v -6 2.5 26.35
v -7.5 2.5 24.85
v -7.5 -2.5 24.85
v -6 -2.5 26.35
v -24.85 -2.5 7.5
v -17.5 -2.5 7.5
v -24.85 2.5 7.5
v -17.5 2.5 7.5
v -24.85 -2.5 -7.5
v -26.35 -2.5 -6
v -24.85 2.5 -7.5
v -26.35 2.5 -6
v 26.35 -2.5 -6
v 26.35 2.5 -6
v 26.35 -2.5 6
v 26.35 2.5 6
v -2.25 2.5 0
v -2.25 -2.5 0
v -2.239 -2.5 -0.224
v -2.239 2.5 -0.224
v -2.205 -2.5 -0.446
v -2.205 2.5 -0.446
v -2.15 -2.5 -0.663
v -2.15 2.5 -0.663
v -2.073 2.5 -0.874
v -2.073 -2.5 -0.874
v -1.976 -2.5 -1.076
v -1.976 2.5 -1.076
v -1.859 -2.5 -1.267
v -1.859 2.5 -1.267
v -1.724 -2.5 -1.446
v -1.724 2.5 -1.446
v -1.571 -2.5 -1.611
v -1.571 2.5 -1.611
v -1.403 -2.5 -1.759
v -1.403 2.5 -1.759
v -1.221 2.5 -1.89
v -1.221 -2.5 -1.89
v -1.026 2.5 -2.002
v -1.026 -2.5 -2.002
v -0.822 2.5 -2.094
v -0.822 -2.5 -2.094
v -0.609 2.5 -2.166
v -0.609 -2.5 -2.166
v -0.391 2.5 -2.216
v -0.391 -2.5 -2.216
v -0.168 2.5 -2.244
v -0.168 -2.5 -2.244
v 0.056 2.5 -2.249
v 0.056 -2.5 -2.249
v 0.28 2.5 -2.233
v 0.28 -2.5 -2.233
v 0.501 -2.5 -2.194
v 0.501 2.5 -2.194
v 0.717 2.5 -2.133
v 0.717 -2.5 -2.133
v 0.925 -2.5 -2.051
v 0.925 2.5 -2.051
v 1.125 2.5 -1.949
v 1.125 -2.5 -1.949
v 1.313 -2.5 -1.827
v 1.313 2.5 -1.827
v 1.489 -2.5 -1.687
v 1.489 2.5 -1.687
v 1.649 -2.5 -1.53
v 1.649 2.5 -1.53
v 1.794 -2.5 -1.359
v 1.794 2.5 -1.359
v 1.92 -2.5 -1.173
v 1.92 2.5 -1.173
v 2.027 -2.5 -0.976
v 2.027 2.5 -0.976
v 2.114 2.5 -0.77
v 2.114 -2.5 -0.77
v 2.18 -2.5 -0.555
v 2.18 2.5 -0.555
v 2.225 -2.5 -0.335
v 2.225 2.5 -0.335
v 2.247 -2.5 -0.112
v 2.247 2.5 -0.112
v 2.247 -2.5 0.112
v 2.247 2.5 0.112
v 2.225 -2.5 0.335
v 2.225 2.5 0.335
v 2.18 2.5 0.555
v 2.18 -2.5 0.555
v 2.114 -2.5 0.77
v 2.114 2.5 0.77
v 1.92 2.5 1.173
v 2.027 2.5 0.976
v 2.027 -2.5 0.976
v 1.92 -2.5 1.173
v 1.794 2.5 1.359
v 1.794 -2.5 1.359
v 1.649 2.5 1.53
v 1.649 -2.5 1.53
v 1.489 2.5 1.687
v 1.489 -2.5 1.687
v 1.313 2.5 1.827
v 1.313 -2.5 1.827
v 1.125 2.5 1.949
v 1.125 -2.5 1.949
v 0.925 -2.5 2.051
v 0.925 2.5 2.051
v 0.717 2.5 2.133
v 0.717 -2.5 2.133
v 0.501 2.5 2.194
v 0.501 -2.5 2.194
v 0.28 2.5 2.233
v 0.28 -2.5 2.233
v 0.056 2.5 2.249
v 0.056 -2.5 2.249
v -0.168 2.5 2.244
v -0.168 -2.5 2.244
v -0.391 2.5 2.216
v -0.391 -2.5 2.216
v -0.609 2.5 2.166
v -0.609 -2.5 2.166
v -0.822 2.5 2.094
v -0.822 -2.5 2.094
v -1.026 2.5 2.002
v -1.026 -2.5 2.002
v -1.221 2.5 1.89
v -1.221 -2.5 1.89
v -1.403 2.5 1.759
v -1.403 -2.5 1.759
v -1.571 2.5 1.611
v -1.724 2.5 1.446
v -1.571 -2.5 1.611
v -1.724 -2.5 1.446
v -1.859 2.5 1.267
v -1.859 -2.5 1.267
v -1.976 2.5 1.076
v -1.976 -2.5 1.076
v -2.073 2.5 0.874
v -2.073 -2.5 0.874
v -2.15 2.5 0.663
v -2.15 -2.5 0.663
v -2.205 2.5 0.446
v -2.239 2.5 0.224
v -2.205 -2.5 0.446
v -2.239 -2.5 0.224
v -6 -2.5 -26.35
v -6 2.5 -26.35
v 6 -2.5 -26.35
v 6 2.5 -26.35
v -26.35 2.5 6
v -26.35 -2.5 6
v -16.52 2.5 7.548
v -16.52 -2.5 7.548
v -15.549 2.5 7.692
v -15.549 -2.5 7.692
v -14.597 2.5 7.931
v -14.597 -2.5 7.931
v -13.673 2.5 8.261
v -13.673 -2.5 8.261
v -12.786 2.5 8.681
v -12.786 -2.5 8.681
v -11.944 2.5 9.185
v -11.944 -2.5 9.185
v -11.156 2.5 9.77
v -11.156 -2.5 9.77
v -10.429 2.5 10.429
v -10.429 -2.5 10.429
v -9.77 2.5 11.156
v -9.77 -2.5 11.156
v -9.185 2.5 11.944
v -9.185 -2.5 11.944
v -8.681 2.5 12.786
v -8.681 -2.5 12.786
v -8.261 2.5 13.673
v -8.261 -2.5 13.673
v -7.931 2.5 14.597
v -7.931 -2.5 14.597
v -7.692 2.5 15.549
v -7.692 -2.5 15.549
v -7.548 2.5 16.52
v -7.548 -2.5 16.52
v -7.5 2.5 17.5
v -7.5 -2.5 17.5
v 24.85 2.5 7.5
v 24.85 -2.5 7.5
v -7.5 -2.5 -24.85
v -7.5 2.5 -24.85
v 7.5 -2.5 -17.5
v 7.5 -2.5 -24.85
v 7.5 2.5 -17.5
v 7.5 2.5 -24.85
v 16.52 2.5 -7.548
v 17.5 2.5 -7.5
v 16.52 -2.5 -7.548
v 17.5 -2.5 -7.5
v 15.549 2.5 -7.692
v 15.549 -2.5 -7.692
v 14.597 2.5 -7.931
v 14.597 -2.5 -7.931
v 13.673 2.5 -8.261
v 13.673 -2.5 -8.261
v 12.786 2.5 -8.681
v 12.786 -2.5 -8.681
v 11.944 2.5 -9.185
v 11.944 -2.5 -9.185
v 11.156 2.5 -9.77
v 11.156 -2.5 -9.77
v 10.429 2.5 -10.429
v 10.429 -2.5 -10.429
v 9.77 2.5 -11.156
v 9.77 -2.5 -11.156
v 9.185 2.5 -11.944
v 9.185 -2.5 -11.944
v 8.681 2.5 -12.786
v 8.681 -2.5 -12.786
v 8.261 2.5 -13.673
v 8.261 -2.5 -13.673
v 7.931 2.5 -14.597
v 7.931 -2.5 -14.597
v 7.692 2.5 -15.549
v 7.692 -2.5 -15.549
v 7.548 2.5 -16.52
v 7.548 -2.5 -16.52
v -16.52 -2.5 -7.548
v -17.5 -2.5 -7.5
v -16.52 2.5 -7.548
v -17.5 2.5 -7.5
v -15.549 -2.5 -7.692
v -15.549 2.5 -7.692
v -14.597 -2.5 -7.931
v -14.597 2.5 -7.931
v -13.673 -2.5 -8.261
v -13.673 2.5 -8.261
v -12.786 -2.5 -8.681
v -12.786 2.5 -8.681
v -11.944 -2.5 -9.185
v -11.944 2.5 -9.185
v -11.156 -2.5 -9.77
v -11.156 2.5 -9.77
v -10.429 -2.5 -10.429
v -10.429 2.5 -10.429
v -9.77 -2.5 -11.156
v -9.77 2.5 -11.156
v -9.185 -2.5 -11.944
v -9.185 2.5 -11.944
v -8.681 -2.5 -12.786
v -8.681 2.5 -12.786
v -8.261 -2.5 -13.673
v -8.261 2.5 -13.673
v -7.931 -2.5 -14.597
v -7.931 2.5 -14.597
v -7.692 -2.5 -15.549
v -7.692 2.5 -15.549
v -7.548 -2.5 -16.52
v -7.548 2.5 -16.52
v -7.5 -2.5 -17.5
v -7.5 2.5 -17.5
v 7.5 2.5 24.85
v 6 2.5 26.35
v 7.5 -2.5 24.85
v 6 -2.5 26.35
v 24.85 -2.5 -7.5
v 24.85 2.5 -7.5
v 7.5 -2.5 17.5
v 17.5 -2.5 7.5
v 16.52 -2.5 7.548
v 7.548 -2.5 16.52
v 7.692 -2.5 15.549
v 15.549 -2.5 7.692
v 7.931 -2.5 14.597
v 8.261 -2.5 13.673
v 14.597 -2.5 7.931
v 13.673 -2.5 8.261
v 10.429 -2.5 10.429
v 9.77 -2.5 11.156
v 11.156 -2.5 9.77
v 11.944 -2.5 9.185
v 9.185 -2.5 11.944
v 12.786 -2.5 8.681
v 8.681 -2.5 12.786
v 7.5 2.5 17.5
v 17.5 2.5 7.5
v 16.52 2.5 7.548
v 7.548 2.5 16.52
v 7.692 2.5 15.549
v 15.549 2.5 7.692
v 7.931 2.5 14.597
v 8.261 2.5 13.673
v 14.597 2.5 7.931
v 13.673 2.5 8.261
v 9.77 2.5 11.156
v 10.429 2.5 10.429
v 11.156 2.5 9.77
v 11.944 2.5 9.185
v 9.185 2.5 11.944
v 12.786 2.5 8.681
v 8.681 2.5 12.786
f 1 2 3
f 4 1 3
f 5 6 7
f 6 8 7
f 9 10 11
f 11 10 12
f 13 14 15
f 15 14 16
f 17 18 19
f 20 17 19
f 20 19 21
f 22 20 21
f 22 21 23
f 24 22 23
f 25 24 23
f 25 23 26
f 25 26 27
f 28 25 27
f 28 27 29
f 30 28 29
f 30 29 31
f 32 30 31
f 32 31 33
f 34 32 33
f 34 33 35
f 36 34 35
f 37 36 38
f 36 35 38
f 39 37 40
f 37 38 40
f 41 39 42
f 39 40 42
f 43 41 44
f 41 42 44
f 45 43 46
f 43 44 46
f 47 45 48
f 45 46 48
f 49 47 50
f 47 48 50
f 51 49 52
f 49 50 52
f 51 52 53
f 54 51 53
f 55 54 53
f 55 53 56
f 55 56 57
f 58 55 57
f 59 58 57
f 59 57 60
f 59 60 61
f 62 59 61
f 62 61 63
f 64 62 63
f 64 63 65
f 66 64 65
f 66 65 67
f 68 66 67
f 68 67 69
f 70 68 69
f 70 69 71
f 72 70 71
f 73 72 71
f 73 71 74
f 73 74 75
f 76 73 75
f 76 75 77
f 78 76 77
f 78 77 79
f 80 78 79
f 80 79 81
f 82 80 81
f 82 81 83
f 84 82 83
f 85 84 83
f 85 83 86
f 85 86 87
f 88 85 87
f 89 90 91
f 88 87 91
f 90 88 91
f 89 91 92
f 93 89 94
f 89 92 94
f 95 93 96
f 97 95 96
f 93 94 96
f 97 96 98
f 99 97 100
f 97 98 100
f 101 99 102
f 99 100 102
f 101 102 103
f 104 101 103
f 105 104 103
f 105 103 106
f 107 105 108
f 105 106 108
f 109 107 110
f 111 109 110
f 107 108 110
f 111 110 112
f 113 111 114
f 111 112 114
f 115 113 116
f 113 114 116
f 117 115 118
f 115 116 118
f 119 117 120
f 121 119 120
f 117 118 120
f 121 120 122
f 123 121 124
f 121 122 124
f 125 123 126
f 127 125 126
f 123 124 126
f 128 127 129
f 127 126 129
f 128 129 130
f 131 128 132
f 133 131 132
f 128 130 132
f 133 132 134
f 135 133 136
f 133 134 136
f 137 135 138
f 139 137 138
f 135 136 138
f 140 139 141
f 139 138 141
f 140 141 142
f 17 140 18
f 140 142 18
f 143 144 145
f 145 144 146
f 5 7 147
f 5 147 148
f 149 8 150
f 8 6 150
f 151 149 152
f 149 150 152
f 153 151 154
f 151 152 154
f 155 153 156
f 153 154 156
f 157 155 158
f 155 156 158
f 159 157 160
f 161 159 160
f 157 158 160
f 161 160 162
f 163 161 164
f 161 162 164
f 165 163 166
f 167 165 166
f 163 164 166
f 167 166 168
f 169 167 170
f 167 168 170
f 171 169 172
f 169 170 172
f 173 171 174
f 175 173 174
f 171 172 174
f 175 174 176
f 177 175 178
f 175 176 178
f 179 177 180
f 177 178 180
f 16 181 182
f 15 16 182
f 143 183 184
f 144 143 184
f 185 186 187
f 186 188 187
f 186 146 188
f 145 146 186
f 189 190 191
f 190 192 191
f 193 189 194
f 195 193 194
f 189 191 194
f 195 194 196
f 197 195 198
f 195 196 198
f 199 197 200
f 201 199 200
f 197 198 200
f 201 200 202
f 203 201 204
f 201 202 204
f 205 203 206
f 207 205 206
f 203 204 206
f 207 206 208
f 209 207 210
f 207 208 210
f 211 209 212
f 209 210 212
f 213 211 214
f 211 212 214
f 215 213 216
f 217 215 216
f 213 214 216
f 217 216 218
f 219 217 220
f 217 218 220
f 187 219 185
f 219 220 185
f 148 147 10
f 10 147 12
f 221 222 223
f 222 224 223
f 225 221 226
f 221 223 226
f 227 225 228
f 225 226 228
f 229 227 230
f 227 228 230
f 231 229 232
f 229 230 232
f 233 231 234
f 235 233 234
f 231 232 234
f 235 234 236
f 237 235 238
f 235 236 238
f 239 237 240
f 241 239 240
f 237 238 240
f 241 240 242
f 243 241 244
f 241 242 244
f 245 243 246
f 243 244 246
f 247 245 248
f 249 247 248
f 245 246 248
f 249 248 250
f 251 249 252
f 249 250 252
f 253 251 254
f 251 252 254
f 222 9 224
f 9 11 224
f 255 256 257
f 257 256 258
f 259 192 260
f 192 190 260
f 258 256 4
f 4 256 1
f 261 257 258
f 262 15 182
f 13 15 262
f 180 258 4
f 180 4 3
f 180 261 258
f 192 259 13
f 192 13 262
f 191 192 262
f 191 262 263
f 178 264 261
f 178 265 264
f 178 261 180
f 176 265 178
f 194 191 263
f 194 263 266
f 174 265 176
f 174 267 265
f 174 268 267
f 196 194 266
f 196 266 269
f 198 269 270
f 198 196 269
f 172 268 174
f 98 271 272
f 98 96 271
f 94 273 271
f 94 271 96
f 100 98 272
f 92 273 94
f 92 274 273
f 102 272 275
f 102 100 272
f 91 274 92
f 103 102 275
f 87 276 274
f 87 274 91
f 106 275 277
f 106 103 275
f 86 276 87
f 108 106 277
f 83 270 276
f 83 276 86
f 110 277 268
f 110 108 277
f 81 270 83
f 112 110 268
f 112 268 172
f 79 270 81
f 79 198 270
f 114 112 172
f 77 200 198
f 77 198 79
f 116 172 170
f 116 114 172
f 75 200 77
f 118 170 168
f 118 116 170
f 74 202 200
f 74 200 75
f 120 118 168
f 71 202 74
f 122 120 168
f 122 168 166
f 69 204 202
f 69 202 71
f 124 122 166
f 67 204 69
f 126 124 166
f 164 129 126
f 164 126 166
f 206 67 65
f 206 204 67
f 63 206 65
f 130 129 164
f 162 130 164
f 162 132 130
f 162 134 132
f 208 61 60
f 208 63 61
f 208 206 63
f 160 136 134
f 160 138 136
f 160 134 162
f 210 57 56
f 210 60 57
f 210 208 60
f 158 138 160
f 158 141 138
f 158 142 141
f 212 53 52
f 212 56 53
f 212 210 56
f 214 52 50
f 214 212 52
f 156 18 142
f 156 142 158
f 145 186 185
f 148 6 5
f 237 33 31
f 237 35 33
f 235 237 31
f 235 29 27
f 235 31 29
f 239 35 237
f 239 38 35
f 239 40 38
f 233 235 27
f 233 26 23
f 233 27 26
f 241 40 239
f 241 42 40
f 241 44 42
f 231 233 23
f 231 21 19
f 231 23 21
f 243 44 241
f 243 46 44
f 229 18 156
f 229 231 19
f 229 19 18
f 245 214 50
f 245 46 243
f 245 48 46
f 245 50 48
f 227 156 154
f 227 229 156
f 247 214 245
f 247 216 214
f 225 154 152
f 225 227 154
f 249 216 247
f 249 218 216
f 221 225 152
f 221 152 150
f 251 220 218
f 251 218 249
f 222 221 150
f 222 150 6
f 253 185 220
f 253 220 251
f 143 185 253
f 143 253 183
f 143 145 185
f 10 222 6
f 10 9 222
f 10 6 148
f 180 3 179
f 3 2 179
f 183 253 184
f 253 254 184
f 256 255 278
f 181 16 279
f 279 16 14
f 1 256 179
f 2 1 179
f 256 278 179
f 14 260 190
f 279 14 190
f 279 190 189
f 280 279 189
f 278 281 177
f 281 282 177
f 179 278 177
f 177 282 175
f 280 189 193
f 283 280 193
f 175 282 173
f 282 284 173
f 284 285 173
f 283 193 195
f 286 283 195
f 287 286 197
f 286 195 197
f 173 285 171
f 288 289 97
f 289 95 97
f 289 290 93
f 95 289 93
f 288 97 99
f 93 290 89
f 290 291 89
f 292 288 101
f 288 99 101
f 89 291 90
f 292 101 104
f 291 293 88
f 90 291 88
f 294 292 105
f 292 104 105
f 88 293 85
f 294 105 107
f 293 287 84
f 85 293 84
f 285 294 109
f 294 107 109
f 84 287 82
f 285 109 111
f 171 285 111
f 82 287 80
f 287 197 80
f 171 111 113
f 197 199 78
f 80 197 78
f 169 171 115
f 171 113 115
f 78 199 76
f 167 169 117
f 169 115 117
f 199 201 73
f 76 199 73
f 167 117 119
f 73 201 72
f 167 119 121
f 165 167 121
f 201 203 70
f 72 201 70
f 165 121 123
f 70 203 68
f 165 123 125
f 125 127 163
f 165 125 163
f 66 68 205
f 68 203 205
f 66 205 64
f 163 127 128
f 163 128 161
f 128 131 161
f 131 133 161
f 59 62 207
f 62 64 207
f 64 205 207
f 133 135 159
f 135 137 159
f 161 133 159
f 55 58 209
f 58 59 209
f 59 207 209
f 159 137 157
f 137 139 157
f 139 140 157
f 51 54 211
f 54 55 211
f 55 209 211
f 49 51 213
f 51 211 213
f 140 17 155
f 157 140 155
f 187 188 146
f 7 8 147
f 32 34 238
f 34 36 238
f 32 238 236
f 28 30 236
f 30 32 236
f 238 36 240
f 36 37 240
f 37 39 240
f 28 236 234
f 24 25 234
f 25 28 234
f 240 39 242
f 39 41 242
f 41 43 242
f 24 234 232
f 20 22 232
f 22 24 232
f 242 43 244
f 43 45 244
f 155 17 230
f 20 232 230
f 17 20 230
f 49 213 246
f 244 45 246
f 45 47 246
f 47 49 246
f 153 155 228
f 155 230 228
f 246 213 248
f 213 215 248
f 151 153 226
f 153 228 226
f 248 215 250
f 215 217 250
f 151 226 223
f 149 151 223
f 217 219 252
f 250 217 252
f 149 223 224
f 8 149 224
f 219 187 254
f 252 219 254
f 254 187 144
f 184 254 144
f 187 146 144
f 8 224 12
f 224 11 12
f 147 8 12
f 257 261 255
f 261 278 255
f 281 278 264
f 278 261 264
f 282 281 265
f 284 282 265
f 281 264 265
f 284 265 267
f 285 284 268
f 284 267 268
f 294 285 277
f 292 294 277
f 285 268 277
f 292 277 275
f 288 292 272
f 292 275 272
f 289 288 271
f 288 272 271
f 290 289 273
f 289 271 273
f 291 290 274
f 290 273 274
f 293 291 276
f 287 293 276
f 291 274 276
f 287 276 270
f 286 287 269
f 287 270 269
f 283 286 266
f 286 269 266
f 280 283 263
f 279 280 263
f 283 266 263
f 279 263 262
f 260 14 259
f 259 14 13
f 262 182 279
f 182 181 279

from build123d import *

# Parameters (mm, degrees)
BOSS_EXTRUDE1_DEPTH      = 2.5
FILLET1_R                = 10
CHAMFER1_SIZE            = 1.5
M4_CLEARANCE_HOLE1_D     = 4.5
M4_CLEARANCE_HOLE1_DEPTH = 5.2
M4_CLEARANCE_HOLE1_TIP   = 1.351936393


with BuildPart() as part:
    # Sketch2 → Boss-Extrude1 (new, symmetric)
    with BuildSketch(Plane(origin=(0, 0, 0), x_dir=(1, 0, 0), z_dir=(0, 1, 0))):
        Polygon((-7.5, 26.35), (7.5, 26.35), (7.5, 7.5), (26.35, 7.5), (26.35, -7.5), (7.5, -7.5), (7.5, -26.35), (-7.5, -26.35), (-7.5, -7.5), (-26.35, -7.5), (-26.35, 7.5), (-7.5, 7.5), align=None)
    extrude(amount=BOSS_EXTRUDE1_DEPTH, both=True)

    # Fillet1
    fillet1_edges = [part.edges().sort_by_distance(p)[0] for p in [
        (7.5, 0, 7.5),
        (-7.5, 0, 7.5),
        (-7.5, 0, -7.5),
        (7.5, 0, -7.5),
    ]]
    fillet(fillet1_edges, radius=FILLET1_R)

    # Chamfer1
    chamfer1_edges = [part.edges().sort_by_distance(p)[0] for p in [
        (26.35, 0, -7.5),
        (26.35, 0, 7.5),
        (7.5, 0, 26.35),
        (-7.5, 0, 26.35),
        (-26.35, 0, 7.5),
        (-26.35, 0, -7.5),
        (-7.5, 0, -26.35),
        (7.5, 0, -26.35),
    ]]
    chamfer(chamfer1_edges, length=CHAMFER1_SIZE)

    # M4 Clearance Hole1
    with Locations(Plane(origin=(0, 2.5, 0), x_dir=(1, 0, 0), z_dir=(0, 1, 0))):
        with Locations((0, 0)):
            Hole(M4_CLEARANCE_HOLE1_D / 2, depth=M4_CLEARANCE_HOLE1_DEPTH)
            with Locations((0, 0, -(M4_CLEARANCE_HOLE1_DEPTH + M4_CLEARANCE_HOLE1_TIP / 2))):  # 118° drill point
                Cone(0, M4_CLEARANCE_HOLE1_D / 2, M4_CLEARANCE_HOLE1_TIP, mode=Mode.SUBTRACT)


solid = part.part
